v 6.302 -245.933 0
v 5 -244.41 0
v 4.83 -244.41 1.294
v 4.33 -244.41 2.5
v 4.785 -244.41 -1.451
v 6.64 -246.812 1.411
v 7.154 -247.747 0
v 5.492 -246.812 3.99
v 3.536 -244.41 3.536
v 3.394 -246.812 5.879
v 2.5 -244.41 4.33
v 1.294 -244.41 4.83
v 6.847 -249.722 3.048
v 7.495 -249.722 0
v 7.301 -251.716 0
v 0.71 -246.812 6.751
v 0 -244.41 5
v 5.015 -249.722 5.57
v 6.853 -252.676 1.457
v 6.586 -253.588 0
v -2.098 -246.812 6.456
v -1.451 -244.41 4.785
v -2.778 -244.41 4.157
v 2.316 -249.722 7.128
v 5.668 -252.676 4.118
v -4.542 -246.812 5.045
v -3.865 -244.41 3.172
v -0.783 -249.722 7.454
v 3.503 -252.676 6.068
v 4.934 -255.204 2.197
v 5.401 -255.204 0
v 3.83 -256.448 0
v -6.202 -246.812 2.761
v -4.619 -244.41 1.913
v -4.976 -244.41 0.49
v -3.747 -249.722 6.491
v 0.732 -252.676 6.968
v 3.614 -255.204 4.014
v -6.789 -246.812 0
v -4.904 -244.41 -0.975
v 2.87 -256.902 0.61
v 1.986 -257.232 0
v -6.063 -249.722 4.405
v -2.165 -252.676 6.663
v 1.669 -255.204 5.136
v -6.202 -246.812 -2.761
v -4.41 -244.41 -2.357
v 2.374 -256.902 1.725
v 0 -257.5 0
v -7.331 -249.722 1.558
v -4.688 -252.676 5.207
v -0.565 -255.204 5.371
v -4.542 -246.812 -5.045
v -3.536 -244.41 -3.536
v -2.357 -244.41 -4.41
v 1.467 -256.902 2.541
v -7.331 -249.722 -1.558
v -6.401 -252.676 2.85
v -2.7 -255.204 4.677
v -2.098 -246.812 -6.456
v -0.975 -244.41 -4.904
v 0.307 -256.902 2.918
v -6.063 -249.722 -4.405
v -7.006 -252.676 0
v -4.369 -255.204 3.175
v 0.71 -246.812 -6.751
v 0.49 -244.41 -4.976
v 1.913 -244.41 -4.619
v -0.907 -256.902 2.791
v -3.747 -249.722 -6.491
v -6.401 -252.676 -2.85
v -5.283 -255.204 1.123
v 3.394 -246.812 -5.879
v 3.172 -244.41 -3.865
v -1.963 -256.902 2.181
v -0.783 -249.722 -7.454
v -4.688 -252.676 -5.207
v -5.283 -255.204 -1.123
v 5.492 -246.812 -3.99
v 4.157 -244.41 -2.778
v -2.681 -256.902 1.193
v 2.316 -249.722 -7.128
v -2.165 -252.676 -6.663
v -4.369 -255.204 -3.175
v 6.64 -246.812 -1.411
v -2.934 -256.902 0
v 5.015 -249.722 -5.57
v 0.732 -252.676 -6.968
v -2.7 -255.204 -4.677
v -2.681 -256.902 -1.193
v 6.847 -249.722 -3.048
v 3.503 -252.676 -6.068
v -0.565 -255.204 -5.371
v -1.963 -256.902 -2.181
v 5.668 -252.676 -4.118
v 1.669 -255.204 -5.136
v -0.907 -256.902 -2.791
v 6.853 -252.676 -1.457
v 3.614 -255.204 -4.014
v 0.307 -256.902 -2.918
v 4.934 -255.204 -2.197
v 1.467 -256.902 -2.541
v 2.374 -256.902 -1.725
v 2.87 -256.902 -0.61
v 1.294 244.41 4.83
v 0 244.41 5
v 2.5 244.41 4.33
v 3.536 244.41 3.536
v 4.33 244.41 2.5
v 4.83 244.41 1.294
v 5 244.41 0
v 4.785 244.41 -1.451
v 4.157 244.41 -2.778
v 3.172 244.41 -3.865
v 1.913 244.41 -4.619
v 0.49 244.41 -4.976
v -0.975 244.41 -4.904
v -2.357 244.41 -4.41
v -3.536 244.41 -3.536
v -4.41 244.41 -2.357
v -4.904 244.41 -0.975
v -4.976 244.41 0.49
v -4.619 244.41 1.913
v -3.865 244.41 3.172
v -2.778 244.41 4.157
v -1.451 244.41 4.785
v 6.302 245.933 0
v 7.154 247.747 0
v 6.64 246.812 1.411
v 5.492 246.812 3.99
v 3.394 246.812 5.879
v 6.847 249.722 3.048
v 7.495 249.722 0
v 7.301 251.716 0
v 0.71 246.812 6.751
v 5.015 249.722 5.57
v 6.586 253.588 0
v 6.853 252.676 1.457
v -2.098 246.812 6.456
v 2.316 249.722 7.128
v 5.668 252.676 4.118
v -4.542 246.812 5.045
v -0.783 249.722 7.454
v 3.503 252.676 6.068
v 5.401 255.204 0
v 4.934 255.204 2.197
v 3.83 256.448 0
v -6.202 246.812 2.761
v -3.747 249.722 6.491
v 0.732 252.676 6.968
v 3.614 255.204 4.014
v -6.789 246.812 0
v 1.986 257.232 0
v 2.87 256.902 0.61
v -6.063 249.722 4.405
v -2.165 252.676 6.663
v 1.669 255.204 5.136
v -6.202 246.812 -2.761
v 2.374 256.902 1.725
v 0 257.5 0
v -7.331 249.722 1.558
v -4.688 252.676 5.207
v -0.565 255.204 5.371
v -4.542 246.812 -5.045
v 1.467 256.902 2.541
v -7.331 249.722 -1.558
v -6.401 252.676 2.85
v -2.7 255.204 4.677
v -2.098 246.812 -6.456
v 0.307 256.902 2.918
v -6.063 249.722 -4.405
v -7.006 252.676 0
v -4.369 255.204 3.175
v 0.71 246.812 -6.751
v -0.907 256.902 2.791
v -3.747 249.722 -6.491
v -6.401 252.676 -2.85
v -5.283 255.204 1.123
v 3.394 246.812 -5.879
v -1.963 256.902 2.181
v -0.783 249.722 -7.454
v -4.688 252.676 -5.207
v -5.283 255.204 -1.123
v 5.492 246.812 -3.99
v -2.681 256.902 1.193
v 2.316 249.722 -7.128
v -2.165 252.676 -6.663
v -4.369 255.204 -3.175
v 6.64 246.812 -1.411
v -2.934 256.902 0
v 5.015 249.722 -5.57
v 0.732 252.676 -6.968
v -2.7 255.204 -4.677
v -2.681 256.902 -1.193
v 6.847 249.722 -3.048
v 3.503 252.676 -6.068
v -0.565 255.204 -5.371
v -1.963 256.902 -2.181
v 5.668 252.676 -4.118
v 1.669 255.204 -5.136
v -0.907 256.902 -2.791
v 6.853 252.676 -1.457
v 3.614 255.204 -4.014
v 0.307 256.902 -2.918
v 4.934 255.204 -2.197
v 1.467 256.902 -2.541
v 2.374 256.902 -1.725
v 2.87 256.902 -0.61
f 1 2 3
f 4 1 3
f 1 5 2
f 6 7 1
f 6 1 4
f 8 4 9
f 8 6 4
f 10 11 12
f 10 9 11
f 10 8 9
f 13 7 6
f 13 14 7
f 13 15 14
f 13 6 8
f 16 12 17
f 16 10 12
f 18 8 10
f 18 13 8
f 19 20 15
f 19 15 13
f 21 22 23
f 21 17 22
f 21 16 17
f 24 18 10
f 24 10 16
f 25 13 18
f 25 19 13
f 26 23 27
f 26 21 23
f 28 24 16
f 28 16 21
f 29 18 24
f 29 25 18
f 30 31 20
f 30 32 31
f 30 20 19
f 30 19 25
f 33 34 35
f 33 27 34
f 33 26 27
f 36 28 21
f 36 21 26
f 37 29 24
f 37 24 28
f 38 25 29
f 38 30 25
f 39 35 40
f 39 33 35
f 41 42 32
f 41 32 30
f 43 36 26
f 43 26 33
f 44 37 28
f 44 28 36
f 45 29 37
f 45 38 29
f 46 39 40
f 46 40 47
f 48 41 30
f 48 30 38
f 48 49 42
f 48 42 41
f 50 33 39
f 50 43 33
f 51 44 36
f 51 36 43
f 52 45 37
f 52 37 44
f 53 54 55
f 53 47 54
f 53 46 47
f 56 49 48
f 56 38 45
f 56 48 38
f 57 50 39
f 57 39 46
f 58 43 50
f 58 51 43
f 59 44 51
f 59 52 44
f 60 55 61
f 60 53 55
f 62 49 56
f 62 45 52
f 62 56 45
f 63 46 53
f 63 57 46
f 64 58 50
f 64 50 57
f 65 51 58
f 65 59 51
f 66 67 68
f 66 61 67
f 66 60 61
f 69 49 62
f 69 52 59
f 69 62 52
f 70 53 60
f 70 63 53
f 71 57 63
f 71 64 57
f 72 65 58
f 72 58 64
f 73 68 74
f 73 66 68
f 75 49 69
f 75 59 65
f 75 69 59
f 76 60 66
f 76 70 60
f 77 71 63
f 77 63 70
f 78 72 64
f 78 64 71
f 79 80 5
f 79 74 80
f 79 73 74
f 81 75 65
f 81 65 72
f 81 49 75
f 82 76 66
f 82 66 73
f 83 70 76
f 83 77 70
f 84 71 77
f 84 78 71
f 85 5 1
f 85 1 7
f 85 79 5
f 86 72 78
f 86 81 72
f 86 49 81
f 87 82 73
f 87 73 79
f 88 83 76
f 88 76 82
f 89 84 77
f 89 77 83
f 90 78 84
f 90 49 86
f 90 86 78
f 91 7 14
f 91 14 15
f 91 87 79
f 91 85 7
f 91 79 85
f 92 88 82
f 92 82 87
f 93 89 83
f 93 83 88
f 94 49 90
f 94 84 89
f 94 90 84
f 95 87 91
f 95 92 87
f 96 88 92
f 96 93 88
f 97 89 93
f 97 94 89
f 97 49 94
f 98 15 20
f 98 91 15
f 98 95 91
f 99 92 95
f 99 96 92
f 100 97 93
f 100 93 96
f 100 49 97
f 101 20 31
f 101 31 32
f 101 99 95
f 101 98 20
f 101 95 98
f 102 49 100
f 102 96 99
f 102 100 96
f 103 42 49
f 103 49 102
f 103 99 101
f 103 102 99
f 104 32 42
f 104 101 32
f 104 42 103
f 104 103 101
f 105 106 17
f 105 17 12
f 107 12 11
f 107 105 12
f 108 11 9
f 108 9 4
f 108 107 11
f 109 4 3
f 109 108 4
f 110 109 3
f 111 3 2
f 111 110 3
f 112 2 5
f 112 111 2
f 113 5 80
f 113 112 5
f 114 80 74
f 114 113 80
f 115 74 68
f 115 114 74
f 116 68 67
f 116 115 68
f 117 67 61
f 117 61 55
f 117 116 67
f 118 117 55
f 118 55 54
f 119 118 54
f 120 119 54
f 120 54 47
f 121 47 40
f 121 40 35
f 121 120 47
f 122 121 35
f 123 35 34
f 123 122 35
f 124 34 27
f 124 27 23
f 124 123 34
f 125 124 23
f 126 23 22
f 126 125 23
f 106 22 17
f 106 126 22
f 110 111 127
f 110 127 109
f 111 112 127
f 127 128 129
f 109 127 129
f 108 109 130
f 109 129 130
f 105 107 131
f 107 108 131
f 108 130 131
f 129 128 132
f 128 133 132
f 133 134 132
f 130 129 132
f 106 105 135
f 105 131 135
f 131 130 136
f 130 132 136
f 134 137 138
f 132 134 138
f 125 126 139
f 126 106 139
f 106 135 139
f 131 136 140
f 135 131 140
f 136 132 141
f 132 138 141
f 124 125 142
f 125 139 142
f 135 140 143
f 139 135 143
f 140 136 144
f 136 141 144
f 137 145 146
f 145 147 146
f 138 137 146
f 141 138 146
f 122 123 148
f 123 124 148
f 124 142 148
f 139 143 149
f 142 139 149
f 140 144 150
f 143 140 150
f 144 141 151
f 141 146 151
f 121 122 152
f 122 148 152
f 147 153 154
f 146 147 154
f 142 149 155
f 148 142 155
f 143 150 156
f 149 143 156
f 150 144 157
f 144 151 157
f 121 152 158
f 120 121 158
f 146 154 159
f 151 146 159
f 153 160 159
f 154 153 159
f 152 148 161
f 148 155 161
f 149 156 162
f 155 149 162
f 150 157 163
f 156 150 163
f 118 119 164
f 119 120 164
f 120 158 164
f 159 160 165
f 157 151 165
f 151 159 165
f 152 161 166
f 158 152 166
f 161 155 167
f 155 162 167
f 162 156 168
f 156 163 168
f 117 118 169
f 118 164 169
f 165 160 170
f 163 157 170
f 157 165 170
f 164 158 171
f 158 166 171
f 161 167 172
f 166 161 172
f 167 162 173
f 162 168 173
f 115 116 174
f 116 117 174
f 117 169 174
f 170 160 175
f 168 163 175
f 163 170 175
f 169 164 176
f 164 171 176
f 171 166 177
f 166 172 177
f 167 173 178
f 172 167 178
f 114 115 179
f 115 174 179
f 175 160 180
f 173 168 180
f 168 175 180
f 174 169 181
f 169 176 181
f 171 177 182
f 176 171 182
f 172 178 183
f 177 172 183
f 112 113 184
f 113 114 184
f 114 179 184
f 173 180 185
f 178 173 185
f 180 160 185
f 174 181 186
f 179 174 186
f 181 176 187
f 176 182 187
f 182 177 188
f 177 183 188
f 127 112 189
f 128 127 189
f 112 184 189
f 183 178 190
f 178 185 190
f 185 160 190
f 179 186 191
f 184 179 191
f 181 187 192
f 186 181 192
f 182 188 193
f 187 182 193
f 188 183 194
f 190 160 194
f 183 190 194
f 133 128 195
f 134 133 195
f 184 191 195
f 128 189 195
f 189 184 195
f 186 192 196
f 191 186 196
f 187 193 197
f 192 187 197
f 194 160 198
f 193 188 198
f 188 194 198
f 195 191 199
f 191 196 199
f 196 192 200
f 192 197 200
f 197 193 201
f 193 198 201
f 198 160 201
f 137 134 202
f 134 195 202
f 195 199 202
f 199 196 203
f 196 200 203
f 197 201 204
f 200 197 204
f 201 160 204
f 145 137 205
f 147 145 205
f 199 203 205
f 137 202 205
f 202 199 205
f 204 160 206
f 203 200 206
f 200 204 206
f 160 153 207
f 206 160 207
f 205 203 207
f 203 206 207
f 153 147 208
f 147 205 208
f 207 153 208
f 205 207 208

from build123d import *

# Parameters (mm, degrees)
SKETCH_2_R      = 5
EXTRUDE_1_DEPTH = 250


with BuildPart() as part:
    # 草图2 → 凸台-拉伸1 (new, symmetric)
    with BuildSketch(Plane(origin=(0, 0, 0), x_dir=(1, 0, 0), z_dir=(0, 1, 0))):
        with Locations(Location((0, 0, 0), (0, 0, 270))):
            Circle(SKETCH_2_R)
    extrude(amount=EXTRUDE_1_DEPTH, both=True)

    # 草图3 → 旋转1 (revolve)
    with BuildSketch(Plane.XY):
        with BuildLine():
            Line((0, 257.5), (0, 242.5))
            ThreePointArc((0, 242.5), (7.5, 250), (0, 257.5))
        make_face()
    revolve_1 = revolve(axis=Axis((0, 257.5, 0), (0, -1, 0)))

    # 镜向1: 旋转1 across plane
    add(revolve_1.mirror(Plane.ZX))


solid = part.part
